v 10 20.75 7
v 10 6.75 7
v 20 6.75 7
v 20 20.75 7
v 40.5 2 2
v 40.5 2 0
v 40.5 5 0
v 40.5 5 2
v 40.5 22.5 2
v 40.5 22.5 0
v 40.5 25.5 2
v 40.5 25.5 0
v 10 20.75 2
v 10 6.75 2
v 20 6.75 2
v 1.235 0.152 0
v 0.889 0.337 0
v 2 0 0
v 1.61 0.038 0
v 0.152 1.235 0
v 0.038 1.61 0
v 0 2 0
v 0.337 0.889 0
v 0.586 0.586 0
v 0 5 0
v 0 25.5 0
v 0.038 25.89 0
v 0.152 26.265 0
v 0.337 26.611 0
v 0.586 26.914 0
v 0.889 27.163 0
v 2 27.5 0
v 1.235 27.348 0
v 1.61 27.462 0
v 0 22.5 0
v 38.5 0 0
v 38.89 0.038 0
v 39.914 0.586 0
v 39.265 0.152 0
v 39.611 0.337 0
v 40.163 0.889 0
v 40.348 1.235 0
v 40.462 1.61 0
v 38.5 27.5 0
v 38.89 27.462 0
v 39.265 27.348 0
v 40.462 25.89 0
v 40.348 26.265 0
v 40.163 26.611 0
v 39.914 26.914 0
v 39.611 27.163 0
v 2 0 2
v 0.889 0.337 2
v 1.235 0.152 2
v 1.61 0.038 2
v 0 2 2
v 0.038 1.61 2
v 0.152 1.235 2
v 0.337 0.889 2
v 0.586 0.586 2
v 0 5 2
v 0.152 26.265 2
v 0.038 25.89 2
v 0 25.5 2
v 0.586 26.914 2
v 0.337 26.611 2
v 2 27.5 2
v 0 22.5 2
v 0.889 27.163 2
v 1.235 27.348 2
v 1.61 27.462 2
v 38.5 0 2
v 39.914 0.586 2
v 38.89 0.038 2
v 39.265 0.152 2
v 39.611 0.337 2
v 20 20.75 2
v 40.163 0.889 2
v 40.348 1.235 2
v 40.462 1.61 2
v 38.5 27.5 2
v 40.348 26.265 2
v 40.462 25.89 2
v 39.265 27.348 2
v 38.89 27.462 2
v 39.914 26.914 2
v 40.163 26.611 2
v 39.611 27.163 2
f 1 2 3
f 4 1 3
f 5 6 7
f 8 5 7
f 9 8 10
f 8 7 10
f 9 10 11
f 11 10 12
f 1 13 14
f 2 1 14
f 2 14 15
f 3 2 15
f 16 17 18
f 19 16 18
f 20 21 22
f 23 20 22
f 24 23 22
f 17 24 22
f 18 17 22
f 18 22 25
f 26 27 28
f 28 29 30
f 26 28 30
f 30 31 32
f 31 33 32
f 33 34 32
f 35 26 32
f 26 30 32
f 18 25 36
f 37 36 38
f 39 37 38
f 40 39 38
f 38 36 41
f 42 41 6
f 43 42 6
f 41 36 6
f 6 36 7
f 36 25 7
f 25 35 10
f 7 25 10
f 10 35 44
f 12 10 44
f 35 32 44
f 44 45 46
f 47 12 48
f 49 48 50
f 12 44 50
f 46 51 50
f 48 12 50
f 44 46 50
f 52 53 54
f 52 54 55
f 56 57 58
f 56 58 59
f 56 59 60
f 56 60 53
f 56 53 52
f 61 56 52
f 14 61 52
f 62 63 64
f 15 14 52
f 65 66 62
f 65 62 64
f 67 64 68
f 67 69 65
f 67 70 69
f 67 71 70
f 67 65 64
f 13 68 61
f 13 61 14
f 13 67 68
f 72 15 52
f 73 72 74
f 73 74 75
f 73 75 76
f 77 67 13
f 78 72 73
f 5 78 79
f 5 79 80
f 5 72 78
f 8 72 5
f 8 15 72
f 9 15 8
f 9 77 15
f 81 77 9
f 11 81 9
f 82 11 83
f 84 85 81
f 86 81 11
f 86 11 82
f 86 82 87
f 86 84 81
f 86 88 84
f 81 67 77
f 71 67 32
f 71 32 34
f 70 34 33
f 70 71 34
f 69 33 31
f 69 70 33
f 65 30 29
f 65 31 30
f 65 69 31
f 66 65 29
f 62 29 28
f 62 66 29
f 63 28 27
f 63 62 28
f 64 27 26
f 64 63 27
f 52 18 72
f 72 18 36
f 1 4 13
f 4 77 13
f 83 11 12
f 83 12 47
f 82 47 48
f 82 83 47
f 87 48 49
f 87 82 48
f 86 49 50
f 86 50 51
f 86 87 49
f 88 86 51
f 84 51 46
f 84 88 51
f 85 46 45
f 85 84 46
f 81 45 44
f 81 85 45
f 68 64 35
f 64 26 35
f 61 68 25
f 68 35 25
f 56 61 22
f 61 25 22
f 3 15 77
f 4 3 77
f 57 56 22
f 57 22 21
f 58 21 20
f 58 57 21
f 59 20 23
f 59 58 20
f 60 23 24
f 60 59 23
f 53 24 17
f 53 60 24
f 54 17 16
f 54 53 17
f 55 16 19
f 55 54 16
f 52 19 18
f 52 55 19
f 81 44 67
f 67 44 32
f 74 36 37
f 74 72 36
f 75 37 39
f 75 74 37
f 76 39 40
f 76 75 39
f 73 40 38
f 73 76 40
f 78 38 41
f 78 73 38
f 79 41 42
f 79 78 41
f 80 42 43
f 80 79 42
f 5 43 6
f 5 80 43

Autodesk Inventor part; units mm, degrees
ref_plane "YZ Plane" through (0, 0, 0) normal (1, 0, 0) x (0, 1, 0)
ref_plane "XZ Plane" through (0, 0, 0) normal (0, 1, 0) x (-1, 0, 0)
ref_plane "XY Plane" through (0, 0, 0) normal (0, 0, 1) x (1, 0, 0)
sketch "Esboço1" plane through (0, 0, 0) normal (0, 0, 1) x (1, 0, 0)
  line L0 (0, 0) -> (40.5, 0)
  line L1 (40.5, 0) -> (40.5, 27.5)
  line L2 (40.5, 27.5) -> (0, 27.5)
  line L3 (0, 27.5) -> (0, 0)
  line L4 (15, 20.75) -> (10, 20.75)
  line L5 (10, 20.75) -> (10, 6.75)
  line L6 (10, 6.75) -> (15, 6.75)
  line L7 (15, 6.75) -> (20, 6.75)
  line L8 (20, 6.75) -> (20, 20.75)
  line L9 (20, 20.75) -> (15, 20.75)
  line L10 (40.5, 27.5) -> (40.5, 22.5)
  line L11 (40.5, 22.5) -> (35.5, 22.5)
  line L12 (40.5, 0) -> (40.5, 5)
  line L13 (40.5, 5) -> (35.5, 5)
  line L14 (0, 0) -> (0, 5)
  line L15 (0, 5) -> (5, 5)
  line L16 (0, 27.5) -> (0, 22.5)
  line L17 (0, 22.5) -> (5, 22.5)
  circle A0 centre (5, 22.5) radius 1.5
  circle A1 centre (5, 5) radius 1.5
  circle A2 centre (35.5, 22.5) radius 1.5
  circle A3 centre (35.5, 5) radius 1.5
  dimension "d0" = 40.5
  dimension "d1" = 27.5
  dimension "d5" = 5
  dimension "d6" = 5
  dimension "d7" = 5
  dimension "d8" = 5
  dimension "d9" = 5
  dimension "d10" = 5
  dimension "d11" = 5
  dimension "d12" = 5
  dimension "d13" = 5
  dimension "d14" = 5
  dimension "d15" = 3
  dimension "d16" = 3
  dimension "d17" = 3
  dimension "d18" = 3
extrude "Extrusão1" add sketch "Esboço1" along normal blind 2 contours L3 L2 L1 L0 | L9 L8 L7 L6 L5 L4
fillet "Arredondamento1" radius 2 4 edges at (0, 27.5, 1) (0, 0, 1) (40.5, 27.5, 1) (40.5, 0, 1)
extrude "Extrusão2" add sketch "Esboço1" along normal blind 7 contours L9 L8 L7 L6 L5 L4
extrude "Extrusão3" add sketch "Esboço1" along normal blind 2 contours A3 | A2 | A0 | A1
properties part number "CASE ESP32 CAM - Tampa"
